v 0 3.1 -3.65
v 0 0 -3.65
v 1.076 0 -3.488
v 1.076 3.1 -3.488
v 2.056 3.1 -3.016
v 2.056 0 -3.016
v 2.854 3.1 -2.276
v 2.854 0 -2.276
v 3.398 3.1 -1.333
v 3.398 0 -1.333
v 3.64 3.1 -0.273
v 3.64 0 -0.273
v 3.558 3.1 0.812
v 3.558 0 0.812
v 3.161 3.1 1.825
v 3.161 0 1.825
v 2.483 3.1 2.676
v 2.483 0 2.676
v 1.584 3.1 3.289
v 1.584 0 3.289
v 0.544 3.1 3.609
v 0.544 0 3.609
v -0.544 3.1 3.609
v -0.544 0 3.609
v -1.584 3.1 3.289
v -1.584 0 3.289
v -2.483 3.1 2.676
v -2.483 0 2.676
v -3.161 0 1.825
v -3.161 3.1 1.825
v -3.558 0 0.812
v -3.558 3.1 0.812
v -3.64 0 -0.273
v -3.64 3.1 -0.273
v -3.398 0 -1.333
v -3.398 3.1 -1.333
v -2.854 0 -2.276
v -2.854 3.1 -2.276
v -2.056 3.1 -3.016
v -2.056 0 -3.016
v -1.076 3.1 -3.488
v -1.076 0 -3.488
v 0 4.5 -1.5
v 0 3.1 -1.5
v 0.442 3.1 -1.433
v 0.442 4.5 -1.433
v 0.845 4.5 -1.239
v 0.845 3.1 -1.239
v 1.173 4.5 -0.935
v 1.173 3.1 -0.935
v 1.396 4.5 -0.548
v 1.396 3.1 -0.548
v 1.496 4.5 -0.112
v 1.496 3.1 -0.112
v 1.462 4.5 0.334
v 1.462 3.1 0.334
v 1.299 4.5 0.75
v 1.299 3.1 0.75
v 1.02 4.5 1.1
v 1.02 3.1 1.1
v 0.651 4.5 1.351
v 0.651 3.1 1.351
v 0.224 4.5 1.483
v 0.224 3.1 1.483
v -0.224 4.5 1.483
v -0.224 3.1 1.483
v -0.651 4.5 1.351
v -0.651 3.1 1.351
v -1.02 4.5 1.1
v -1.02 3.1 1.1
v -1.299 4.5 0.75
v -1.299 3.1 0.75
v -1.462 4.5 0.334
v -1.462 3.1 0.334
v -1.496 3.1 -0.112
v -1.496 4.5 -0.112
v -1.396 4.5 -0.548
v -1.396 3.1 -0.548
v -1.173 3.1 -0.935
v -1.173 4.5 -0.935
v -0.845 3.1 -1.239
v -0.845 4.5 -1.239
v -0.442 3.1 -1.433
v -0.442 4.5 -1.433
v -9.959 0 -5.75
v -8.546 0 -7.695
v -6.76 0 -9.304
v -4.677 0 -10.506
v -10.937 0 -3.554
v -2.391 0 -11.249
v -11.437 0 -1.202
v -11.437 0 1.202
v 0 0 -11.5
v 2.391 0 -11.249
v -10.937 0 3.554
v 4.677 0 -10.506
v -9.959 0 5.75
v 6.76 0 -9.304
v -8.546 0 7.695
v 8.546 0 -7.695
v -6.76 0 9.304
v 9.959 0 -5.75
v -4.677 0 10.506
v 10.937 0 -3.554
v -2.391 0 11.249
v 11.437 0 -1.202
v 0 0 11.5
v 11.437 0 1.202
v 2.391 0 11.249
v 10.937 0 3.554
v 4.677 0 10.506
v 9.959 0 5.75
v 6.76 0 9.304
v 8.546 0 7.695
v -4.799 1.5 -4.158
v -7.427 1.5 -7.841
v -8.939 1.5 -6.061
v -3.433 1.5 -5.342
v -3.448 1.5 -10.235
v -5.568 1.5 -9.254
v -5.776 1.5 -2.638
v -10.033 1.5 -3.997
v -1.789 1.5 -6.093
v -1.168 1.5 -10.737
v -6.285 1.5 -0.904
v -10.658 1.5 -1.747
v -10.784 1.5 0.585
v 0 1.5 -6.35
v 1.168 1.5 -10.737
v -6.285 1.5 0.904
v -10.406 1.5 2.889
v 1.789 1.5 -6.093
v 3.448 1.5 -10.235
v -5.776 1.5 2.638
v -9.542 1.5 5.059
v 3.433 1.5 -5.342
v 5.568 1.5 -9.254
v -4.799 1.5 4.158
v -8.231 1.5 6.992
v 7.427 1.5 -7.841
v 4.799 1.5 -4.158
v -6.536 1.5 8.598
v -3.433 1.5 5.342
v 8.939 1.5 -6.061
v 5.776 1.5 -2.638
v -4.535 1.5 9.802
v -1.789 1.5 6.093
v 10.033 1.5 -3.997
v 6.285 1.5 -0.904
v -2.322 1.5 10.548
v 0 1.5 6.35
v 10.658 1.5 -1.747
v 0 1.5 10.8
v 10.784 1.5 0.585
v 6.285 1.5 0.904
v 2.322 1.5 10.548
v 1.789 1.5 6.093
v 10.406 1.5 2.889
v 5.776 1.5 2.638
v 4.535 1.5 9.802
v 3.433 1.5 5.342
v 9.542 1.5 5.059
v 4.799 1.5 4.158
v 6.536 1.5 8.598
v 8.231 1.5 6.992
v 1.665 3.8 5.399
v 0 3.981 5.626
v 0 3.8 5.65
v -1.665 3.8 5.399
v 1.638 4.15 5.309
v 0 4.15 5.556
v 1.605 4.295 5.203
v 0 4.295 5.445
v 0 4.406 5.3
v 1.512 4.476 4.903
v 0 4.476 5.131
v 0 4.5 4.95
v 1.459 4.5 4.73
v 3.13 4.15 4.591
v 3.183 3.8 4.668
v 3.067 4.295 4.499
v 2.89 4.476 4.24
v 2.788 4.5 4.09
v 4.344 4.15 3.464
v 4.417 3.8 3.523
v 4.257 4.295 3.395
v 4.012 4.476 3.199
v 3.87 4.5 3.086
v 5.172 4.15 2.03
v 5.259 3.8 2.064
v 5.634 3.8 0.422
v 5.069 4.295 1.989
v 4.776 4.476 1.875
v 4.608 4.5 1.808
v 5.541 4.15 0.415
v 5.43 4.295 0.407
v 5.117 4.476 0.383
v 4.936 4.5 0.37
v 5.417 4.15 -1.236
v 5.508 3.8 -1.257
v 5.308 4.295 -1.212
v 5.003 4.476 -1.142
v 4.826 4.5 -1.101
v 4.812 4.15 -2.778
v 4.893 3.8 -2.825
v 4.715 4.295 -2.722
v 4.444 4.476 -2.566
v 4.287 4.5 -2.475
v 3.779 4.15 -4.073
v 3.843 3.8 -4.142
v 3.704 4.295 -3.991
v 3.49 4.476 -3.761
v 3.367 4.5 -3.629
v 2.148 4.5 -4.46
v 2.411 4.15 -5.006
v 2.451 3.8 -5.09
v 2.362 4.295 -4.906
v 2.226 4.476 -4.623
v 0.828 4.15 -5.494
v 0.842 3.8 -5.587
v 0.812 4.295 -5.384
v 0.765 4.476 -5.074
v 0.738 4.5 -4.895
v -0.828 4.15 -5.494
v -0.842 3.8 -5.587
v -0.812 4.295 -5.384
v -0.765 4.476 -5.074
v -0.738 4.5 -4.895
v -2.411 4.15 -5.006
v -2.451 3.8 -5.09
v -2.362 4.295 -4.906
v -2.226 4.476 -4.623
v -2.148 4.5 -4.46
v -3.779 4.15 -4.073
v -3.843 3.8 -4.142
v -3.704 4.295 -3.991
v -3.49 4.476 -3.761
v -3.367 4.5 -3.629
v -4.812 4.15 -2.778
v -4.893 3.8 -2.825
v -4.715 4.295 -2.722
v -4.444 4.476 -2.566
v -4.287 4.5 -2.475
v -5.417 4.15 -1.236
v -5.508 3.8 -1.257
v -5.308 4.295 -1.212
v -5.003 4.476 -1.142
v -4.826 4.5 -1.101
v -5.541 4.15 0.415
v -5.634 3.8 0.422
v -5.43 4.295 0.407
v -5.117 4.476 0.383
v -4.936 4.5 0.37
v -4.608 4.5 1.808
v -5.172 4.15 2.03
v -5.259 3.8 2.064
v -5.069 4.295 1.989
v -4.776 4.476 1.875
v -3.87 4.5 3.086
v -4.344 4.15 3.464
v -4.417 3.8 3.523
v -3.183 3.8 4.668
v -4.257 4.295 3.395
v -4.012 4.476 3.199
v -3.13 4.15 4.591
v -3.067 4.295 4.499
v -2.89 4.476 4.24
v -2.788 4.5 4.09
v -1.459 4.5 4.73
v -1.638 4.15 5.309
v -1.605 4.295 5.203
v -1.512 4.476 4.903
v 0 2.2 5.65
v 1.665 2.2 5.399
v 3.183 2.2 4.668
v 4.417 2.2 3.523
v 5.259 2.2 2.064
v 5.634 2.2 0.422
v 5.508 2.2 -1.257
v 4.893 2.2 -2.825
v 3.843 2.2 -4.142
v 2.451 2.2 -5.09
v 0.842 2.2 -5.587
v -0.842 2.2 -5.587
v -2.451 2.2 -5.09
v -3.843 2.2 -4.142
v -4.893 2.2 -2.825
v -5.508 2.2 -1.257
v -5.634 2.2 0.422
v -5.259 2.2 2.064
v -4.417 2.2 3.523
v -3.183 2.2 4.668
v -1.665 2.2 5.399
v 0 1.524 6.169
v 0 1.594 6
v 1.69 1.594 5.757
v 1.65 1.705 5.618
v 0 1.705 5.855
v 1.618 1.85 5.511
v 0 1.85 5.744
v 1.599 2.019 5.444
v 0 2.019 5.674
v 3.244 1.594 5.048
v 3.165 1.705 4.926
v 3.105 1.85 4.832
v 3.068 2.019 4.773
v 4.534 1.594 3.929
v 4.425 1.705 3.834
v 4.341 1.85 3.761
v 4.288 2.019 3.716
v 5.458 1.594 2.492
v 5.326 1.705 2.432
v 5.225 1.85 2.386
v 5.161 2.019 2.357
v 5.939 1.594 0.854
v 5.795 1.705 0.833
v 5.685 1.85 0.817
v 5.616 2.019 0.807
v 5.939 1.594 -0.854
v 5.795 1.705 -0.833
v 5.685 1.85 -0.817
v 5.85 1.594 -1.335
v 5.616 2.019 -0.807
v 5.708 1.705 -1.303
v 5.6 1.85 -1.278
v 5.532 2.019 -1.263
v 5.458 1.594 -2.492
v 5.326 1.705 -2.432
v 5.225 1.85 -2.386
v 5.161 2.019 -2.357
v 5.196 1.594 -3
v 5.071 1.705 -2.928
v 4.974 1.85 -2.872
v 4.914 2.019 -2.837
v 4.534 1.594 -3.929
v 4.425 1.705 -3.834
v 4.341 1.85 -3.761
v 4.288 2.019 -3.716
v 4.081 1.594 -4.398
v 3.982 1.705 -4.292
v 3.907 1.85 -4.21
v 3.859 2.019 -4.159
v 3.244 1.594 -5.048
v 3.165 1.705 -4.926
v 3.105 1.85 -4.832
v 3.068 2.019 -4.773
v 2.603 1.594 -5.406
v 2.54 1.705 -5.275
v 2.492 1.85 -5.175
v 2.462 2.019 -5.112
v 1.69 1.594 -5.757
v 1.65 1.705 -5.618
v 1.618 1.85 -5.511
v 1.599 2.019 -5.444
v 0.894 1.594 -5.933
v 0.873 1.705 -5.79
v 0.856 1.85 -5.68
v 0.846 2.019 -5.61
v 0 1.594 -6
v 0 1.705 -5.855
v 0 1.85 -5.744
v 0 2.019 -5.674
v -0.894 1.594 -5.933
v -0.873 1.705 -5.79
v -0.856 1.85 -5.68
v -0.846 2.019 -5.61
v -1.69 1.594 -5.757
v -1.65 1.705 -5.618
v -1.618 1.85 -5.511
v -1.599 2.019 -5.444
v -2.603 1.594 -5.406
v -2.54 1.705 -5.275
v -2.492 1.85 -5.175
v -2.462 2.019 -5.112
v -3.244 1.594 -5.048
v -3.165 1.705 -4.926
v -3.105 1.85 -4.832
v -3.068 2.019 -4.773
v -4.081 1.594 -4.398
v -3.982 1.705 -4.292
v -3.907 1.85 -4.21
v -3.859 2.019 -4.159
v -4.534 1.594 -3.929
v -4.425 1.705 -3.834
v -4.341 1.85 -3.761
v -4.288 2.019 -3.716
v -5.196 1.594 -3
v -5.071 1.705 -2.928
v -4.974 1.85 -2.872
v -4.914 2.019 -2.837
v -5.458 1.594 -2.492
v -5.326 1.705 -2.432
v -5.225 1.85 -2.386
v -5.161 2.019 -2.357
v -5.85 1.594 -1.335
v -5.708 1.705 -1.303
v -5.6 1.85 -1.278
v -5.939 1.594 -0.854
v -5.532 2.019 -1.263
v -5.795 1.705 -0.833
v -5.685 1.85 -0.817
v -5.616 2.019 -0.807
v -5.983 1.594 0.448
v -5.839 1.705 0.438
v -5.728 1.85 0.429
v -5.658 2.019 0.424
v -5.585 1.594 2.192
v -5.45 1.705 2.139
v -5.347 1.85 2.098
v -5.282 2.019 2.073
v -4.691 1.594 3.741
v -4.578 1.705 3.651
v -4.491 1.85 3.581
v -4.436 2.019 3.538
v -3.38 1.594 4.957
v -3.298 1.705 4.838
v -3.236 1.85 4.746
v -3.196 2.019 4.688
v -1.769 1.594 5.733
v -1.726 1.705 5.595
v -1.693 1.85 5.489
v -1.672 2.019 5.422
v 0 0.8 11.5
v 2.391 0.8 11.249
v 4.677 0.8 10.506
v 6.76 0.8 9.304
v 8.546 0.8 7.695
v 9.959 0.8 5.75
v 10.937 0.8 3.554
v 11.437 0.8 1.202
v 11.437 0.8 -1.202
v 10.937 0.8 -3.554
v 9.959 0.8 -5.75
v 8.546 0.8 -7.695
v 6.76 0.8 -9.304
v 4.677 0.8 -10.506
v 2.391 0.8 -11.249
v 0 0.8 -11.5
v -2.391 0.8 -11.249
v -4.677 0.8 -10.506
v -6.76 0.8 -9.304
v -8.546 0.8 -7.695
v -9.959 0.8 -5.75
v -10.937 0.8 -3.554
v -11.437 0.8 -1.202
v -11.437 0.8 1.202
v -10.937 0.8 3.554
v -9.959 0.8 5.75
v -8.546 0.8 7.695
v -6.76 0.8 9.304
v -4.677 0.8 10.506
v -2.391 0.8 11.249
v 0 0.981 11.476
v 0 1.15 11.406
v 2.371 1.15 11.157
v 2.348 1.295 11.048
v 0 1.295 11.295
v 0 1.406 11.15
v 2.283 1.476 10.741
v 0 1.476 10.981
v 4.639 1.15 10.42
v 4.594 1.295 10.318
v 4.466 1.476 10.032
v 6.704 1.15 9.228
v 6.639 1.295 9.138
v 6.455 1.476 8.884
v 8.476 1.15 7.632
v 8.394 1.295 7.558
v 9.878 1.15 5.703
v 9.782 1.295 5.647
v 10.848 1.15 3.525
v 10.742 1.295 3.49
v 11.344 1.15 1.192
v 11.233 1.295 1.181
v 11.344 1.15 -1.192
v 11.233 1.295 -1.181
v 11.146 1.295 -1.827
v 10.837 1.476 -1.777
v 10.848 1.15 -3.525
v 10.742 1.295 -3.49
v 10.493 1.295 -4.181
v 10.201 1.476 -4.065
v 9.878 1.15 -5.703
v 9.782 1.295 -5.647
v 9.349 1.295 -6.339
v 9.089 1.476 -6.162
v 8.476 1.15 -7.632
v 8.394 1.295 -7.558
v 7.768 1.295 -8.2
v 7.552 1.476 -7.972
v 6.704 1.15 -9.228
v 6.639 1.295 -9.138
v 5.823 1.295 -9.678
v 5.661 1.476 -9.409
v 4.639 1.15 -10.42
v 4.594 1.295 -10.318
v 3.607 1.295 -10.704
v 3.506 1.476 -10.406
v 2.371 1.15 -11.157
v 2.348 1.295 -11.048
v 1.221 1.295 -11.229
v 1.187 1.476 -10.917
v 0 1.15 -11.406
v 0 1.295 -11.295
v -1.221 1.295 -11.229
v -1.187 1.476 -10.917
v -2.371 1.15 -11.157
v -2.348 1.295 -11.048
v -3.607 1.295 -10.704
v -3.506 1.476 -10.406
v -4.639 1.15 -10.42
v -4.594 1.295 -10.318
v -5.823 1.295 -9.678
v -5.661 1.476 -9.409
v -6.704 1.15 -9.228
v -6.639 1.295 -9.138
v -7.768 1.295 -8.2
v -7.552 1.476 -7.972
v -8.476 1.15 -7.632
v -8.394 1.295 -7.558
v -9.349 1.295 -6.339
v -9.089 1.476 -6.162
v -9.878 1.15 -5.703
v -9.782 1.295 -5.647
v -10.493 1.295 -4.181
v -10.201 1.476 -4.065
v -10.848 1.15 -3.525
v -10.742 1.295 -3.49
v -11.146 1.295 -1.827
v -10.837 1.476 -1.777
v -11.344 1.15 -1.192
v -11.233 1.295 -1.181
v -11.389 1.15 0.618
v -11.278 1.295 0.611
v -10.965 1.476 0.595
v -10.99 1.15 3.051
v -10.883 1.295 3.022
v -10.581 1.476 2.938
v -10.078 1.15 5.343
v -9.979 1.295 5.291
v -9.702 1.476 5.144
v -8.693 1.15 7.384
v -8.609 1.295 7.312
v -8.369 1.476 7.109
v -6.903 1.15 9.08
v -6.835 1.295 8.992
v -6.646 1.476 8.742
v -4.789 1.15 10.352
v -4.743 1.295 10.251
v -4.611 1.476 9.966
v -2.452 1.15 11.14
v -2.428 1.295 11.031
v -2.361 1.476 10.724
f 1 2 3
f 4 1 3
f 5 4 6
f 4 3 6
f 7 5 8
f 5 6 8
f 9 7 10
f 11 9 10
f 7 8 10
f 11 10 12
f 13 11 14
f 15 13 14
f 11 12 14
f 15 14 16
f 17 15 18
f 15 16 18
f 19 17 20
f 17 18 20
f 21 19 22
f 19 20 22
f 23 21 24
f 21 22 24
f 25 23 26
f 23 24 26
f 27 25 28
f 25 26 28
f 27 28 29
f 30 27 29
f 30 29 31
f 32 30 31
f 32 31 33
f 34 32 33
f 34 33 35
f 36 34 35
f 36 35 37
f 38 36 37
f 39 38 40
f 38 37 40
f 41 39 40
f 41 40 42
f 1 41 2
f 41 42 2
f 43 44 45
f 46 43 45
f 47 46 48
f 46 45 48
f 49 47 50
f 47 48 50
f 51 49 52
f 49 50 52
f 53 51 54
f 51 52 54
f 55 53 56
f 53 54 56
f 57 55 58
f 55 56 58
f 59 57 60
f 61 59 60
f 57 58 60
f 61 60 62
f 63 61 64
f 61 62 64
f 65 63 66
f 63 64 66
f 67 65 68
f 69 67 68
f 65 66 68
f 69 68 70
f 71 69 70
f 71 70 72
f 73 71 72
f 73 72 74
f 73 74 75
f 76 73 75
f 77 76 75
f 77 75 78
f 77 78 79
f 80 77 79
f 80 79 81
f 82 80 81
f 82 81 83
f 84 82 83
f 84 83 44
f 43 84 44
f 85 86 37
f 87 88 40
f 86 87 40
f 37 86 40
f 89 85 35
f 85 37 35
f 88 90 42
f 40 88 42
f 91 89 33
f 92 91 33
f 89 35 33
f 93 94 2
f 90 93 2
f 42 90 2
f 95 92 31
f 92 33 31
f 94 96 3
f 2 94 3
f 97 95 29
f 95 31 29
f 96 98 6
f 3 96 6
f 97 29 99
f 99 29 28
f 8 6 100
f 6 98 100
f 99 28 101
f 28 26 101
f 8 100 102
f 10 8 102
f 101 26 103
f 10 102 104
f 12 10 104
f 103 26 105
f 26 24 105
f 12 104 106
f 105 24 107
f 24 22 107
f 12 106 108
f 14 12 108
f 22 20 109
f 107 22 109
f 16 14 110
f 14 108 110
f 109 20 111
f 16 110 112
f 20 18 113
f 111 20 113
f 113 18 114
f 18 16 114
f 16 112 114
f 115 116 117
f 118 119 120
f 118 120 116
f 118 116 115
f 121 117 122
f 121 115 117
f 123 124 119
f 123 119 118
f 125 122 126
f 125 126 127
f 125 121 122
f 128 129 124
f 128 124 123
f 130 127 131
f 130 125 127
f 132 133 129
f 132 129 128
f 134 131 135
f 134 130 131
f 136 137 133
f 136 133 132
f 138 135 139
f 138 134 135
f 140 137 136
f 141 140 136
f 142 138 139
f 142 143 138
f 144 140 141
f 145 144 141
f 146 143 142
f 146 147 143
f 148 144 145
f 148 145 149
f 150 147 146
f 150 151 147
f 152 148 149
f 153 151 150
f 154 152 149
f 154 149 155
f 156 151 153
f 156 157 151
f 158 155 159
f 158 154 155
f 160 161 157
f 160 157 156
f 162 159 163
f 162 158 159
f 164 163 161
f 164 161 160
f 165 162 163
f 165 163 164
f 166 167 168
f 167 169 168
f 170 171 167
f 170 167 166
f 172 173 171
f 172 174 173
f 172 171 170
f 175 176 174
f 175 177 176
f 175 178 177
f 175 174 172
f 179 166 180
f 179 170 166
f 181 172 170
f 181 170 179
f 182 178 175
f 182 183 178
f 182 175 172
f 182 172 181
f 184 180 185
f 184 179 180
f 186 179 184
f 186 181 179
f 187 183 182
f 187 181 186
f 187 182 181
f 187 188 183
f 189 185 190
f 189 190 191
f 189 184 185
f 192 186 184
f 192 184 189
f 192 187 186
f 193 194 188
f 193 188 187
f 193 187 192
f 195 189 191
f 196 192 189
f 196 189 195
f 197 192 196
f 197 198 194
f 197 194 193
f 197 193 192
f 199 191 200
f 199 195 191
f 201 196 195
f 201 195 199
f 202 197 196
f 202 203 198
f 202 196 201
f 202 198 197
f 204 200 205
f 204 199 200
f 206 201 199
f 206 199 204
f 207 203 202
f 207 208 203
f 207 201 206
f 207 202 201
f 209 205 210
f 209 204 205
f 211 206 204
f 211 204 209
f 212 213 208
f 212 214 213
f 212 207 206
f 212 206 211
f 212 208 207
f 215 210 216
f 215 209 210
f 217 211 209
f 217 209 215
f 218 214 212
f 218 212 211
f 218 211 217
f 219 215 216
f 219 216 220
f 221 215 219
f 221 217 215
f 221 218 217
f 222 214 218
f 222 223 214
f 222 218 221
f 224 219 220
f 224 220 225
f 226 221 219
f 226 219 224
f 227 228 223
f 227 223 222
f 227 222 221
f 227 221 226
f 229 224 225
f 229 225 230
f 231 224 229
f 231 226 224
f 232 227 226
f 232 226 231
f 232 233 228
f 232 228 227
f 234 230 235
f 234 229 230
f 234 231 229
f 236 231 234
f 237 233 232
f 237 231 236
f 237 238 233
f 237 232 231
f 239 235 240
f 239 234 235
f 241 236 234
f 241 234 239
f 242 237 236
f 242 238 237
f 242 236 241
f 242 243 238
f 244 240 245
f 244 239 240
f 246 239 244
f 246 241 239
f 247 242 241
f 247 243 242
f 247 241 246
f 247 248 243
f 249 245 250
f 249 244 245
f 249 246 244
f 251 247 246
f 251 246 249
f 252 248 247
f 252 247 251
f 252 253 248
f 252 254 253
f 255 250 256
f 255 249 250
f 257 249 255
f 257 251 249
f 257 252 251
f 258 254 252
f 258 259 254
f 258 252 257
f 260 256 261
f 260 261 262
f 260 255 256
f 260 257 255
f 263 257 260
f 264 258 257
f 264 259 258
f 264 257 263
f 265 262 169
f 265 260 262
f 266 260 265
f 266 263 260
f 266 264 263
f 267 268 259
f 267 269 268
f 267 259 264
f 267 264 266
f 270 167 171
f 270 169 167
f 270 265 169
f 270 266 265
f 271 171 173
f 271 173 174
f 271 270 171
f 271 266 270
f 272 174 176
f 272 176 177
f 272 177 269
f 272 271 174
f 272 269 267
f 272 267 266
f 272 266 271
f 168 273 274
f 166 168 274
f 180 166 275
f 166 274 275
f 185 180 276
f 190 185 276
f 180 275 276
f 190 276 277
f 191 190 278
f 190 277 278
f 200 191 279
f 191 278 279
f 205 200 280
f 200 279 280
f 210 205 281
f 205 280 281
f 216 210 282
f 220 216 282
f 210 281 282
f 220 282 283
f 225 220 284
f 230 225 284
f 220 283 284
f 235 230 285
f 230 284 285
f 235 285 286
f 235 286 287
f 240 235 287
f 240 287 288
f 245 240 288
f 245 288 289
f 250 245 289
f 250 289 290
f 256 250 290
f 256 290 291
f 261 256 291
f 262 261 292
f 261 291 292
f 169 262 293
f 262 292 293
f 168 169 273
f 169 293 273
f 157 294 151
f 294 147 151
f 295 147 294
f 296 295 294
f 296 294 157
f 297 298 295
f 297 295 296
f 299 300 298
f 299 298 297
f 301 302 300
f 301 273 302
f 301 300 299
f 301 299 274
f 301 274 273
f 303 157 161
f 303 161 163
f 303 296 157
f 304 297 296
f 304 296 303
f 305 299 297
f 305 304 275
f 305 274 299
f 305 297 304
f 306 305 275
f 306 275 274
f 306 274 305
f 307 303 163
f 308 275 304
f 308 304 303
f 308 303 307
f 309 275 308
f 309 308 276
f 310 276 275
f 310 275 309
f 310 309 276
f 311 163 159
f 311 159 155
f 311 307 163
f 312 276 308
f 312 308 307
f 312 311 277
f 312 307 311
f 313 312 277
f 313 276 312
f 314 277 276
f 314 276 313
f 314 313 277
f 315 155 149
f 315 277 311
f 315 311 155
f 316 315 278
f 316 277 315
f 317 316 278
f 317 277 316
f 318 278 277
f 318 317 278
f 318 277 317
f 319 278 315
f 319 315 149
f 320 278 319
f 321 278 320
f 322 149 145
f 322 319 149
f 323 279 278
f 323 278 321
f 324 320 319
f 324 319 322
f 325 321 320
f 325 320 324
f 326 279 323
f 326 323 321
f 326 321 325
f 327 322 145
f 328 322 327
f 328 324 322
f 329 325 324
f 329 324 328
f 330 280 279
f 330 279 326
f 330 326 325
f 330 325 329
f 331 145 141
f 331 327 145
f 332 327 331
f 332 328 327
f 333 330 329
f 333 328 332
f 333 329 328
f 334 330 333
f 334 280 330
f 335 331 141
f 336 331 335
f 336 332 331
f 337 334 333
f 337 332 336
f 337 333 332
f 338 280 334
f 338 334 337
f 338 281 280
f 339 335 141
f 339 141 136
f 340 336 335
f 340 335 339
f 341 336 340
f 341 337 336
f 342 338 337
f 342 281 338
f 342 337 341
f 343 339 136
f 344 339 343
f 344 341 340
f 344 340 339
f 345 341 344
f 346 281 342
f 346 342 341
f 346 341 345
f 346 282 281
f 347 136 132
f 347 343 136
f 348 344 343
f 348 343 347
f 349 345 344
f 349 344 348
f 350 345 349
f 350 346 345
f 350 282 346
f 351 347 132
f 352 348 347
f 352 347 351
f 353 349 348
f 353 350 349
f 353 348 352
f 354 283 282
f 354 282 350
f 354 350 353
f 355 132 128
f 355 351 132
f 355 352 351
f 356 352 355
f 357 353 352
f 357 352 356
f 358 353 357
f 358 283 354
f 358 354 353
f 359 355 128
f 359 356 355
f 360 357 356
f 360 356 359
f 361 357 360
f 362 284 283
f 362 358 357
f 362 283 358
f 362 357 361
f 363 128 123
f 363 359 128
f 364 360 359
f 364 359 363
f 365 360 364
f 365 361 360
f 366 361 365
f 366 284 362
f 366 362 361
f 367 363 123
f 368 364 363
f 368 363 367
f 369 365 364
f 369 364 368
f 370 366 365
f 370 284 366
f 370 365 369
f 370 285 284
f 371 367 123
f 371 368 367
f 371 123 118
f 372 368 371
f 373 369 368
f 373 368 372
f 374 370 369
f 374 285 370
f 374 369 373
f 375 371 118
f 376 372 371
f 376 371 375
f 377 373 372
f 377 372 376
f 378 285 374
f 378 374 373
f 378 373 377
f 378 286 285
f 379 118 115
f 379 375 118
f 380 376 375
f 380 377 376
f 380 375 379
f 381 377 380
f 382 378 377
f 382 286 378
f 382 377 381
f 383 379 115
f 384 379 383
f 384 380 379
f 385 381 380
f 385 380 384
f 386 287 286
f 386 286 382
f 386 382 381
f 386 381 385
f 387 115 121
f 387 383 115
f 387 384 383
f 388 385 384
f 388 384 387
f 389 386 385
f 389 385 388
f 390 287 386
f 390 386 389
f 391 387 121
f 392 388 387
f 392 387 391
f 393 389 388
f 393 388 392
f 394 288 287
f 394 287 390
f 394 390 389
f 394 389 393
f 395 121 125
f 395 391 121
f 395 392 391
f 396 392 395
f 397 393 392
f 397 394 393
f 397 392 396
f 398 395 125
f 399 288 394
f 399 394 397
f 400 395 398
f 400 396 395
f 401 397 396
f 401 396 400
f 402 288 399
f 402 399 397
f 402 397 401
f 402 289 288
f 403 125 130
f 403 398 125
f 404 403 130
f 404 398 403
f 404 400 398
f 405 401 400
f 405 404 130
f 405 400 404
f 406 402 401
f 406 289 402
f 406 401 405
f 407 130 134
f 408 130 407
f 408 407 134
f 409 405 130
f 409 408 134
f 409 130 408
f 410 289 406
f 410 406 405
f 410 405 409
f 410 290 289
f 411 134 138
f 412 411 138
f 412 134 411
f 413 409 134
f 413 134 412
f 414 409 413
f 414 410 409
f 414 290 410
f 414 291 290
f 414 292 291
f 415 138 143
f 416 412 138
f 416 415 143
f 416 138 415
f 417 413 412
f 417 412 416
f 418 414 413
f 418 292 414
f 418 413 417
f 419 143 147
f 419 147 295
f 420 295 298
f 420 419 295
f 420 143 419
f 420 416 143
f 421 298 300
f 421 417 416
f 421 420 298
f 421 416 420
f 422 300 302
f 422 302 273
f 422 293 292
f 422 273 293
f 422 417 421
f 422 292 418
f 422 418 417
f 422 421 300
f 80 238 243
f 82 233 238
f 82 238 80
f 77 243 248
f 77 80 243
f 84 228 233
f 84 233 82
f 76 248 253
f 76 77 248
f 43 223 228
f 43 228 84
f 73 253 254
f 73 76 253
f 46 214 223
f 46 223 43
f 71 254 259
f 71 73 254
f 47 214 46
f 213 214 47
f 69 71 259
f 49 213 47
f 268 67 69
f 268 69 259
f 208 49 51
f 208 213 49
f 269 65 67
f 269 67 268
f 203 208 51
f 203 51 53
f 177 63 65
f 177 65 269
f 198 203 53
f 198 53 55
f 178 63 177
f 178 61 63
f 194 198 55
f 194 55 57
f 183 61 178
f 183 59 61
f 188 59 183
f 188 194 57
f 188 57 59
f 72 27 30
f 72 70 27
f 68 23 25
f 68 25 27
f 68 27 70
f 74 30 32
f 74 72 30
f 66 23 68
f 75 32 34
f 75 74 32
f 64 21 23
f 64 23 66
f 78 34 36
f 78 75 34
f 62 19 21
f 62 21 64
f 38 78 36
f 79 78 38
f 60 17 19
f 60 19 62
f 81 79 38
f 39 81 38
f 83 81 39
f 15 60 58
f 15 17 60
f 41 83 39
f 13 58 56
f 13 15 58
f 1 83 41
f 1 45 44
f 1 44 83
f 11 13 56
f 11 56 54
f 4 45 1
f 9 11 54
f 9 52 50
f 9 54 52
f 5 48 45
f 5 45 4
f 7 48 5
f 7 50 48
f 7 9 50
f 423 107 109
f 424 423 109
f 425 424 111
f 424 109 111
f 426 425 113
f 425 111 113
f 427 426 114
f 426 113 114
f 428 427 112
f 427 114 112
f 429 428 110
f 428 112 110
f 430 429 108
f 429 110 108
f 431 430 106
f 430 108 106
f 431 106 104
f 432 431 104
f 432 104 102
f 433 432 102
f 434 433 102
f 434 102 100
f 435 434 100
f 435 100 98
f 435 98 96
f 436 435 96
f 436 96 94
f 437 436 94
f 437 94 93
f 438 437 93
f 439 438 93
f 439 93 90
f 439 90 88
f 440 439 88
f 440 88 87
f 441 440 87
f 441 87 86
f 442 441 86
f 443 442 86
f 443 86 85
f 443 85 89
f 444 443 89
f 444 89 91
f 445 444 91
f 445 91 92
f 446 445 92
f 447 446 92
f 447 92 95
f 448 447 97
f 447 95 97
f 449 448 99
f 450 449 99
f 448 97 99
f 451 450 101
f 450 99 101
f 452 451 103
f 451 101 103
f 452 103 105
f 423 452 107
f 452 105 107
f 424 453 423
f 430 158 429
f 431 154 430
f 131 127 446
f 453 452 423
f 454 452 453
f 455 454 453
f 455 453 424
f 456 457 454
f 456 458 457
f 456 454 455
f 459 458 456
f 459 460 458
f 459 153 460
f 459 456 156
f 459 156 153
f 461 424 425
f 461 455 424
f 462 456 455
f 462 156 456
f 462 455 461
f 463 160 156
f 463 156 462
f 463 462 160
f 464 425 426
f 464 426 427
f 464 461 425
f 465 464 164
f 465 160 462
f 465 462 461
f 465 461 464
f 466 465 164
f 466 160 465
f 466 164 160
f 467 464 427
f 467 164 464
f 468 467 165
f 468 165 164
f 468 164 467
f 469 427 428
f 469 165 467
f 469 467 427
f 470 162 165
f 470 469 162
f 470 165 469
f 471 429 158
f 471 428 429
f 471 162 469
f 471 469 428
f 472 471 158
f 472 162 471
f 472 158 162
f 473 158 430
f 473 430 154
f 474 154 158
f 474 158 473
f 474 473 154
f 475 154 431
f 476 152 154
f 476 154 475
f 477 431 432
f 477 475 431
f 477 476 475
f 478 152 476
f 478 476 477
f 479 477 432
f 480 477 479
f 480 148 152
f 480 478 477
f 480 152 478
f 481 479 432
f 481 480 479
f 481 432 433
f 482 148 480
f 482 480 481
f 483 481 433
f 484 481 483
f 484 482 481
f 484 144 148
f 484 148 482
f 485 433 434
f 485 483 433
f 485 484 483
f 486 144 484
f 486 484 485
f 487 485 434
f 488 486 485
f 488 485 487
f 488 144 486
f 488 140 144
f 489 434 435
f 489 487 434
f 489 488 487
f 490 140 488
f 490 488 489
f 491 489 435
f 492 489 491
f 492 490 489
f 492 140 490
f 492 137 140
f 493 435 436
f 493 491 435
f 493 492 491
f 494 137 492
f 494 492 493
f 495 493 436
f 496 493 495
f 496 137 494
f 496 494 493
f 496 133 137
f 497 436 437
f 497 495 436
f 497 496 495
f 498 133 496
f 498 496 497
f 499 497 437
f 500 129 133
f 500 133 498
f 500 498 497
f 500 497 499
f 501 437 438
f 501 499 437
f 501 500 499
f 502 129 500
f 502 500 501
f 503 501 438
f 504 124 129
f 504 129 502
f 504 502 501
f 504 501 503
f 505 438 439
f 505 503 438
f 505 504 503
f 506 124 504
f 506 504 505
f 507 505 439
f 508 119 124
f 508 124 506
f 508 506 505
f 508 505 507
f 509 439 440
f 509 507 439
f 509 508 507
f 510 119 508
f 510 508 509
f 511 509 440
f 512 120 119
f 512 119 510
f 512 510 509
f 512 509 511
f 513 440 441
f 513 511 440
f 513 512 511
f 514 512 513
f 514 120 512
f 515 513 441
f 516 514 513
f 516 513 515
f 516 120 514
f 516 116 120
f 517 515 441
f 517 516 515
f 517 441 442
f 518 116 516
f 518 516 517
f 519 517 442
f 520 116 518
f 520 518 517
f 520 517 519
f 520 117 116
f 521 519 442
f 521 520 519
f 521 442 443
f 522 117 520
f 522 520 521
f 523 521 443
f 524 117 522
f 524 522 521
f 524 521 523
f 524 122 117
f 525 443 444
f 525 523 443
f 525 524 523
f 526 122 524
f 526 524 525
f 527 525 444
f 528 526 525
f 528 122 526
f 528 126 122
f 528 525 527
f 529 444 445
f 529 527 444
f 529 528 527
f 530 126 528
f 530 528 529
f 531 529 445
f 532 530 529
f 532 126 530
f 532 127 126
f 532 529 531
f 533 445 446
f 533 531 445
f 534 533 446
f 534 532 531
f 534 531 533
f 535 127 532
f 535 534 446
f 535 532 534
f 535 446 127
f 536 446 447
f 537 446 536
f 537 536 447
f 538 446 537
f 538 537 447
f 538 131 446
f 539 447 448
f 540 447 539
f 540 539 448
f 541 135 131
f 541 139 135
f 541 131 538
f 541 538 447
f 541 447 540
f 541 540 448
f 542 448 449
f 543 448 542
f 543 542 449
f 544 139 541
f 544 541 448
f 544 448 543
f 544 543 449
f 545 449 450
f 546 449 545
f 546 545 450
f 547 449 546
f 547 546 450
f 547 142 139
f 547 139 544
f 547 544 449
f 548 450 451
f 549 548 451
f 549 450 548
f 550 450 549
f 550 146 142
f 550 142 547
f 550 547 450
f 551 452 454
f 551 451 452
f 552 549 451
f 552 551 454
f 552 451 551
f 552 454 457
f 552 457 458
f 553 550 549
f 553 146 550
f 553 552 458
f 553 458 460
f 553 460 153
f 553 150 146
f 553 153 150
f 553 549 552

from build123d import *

# Parameters (mm, degrees)
SKETCH1_R           = 11.5
BOSS_EXTRUDE1_DEPTH = 4.5
SKETCH2_R           = 3.65
CUT_EXTRUDE1_DEPTH  = 3.1
SKETCH3_R           = 1.5
CUT_EXTRUDE2_DEPTH  = 17.556267695
CUT_EXTRUDE4_START  = -3
SKETCH4_R           = 11.5
SKETCH4_R_2         = 5.65
CUT_EXTRUDE4_DEPTH  = 3
FILLET2_R           = 0.7


with BuildPart() as part:
    # Sketch1 → Boss-Extrude1 (new body)
    with BuildSketch(Plane(origin=(0, 0, 0), x_dir=(1, 0, 0), z_dir=(0, 1, 0))):
        with Locations(Location((0, 0, 0), (0, 0, 270))):
            Circle(SKETCH1_R)
    extrude(amount=BOSS_EXTRUDE1_DEPTH)

    # Sketch2 → Cut-Extrude1 (cut)
    with BuildSketch(Plane.XZ):
        with Locations(Location((0, 0, 0), (0, 0, 270))):
            Circle(SKETCH2_R)
    extrude(amount=-CUT_EXTRUDE1_DEPTH, mode=Mode.SUBTRACT)

    # Sketch3 → Cut-Extrude2 (cut, through all)
    with BuildSketch(Plane.XZ.offset(-3.1)):
        with Locations(Location((0, 0, 0), (0, 0, 270))):
            Circle(SKETCH3_R)
    extrude(amount=-CUT_EXTRUDE2_DEPTH, mode=Mode.SUBTRACT)

    # Sketch4 → Cut-Extrude4 (cut)
    with BuildSketch(Plane(origin=(0, 4.5, 0), x_dir=(1, 0, 0), z_dir=(0, 1, 0)).offset(CUT_EXTRUDE4_START)):
        with Locations(Location((0, 0, 0), (0, 0, 270))):
            Circle(SKETCH4_R)
        with Locations(Location((0, 0, 0), (0, 0, 270))):
            Circle(SKETCH4_R_2, mode=Mode.SUBTRACT)
    extrude(amount=CUT_EXTRUDE4_DEPTH, mode=Mode.SUBTRACT)

    # Fillet2
    fillet2_edges = [part.edges().sort_by_distance(p)[0] for p in [
        (0, 1.5, -11.5),
        (0, 1.5, -5.65),
        (0, 4.5, -5.65),
    ]]
    fillet(fillet2_edges, radius=FILLET2_R)


solid = part.part
